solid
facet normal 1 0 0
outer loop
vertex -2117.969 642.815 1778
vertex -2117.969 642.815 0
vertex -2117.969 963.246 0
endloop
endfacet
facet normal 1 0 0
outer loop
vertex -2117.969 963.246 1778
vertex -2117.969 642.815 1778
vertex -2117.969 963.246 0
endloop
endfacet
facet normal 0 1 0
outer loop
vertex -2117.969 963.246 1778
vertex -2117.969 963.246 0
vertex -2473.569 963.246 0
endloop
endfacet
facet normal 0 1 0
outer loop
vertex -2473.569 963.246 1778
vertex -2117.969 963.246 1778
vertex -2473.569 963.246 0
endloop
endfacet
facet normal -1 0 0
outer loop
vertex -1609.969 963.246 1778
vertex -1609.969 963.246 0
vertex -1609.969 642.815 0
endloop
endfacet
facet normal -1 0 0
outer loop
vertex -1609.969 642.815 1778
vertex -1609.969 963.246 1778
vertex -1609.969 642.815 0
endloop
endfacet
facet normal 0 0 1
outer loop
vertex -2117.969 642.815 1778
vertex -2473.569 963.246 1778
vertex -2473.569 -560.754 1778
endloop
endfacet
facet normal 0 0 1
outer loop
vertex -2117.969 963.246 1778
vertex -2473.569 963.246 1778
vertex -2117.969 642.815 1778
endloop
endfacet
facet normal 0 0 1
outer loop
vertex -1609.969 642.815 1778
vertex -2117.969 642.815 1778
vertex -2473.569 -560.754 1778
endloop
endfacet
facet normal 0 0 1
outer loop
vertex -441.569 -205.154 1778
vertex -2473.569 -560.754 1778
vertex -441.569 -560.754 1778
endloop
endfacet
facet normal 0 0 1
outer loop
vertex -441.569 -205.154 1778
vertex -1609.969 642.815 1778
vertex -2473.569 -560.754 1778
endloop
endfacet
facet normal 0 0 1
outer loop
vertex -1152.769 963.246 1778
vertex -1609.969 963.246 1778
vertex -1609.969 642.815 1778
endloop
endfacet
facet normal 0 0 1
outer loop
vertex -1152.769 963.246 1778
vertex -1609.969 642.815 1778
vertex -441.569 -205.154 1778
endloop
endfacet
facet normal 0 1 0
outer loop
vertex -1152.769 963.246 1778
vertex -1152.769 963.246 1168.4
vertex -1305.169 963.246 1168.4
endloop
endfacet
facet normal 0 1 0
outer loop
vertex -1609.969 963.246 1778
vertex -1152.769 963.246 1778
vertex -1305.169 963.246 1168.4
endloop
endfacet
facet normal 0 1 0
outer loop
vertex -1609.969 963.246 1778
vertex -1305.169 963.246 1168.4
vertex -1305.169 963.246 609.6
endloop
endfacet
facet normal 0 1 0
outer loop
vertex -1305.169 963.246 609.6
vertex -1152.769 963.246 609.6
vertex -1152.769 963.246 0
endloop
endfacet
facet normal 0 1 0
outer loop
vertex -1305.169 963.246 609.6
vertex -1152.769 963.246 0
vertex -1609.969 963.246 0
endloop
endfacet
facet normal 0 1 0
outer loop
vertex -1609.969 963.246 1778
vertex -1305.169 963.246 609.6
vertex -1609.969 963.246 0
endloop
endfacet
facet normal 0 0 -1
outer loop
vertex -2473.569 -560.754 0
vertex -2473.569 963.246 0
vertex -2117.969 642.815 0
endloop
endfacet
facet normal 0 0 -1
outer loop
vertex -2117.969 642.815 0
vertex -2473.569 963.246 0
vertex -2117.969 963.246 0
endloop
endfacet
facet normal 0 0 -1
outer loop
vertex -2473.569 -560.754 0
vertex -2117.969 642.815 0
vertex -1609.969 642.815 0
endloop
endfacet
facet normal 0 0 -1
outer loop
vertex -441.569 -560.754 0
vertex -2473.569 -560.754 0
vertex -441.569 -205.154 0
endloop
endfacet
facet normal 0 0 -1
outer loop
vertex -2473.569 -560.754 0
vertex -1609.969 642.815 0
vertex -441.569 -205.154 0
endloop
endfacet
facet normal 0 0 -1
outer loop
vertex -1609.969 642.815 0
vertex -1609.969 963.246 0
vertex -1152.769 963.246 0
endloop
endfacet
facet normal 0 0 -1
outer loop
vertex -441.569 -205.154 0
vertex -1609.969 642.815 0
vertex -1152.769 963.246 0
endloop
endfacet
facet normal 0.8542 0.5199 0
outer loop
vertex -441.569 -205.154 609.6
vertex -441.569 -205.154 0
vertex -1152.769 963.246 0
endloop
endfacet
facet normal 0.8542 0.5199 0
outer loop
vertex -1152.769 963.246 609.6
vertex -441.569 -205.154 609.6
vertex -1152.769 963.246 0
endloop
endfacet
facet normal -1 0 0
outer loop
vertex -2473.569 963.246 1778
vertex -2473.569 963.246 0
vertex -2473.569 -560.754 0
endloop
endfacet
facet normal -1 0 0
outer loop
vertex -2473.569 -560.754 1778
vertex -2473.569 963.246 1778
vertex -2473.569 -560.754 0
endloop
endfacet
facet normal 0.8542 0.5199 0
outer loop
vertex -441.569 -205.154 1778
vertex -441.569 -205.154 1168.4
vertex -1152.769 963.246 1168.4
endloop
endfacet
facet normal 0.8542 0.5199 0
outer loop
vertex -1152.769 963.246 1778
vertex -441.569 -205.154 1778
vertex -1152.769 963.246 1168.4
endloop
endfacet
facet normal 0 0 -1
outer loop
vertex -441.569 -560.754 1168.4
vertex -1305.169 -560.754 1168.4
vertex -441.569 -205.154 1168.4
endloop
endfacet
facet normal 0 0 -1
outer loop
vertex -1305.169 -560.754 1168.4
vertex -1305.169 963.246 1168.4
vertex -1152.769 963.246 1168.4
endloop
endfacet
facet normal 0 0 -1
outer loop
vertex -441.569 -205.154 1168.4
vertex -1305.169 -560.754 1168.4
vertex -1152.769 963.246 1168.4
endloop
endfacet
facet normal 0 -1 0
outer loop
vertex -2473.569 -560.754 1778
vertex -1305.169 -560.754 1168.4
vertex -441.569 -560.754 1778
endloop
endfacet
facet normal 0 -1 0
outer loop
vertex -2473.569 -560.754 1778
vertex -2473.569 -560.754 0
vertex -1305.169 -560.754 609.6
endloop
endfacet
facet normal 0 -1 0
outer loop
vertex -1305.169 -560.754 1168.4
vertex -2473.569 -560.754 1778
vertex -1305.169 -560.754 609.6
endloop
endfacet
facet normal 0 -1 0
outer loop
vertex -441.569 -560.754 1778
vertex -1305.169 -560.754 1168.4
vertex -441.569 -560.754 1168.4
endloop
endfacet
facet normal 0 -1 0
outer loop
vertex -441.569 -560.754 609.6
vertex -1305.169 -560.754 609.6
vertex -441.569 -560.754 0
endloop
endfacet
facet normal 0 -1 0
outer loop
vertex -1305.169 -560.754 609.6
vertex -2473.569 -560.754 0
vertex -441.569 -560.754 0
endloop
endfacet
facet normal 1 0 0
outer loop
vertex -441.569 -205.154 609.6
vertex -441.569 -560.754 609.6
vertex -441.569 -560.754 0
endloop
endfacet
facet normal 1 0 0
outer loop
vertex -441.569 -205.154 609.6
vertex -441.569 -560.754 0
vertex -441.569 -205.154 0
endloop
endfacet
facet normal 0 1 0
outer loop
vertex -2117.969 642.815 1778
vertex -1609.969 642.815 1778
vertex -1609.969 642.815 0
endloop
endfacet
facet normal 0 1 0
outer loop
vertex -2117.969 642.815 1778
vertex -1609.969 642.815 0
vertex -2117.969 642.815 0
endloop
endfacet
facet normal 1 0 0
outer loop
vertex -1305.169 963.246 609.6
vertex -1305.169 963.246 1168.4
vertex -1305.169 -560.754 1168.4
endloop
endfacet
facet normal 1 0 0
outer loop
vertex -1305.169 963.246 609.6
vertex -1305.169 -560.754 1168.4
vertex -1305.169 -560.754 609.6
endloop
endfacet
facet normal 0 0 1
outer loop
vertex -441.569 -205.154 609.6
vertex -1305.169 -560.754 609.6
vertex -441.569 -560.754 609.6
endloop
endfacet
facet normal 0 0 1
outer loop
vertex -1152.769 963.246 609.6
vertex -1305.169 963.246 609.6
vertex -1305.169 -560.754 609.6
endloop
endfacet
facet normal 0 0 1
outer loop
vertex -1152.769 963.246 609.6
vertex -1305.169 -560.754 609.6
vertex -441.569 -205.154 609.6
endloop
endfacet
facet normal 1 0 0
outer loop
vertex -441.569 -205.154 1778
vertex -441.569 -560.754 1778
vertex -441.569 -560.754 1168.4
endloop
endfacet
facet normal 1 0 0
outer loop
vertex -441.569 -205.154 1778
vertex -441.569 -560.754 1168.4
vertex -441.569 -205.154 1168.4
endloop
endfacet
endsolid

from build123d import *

# Parameters (mm, degrees)
Y_KSEKLIK_EKSTR_ZYON1_DEPTH = 1778
IZIM2_W                     = 1047.214946636
IZIM2_H                     = 558.8
KES_EKSTR_ZYON2_DEPTH       = 1778


with BuildPart() as part:
    # Çizim1 → Yükseklik-Ekstrüzyon1 (new body)
    with BuildSketch(Plane.XY):
        Polygon((-2473.569230769, 963.246153846), (-2473.569230769, -560.753846154), (-441.569230769, -560.753846154), (-441.569230769, -205.153846154), (-1152.769230769, 963.246153846), (-1609.969230769, 963.246153846), (-1609.969230769, 642.815384615), (-2117.969230769, 642.815384615), (-2117.969230769, 963.246153846), align=None)
    extrude(amount=Y_KSEKLIK_EKSTR_ZYON1_DEPTH)

    # Çizim2 → Kes-Ekstrüzyon2 (cut)
    with BuildSketch(Plane(origin=(0, 963.246153846, 0), x_dir=(1, 0, 0), z_dir=(0, 1, 0))):
        with Locations((-781.561757451, -889)):
            Rectangle(IZIM2_W, IZIM2_H)
    extrude(amount=-KES_EKSTR_ZYON2_DEPTH, mode=Mode.SUBTRACT)


solid = part.part
